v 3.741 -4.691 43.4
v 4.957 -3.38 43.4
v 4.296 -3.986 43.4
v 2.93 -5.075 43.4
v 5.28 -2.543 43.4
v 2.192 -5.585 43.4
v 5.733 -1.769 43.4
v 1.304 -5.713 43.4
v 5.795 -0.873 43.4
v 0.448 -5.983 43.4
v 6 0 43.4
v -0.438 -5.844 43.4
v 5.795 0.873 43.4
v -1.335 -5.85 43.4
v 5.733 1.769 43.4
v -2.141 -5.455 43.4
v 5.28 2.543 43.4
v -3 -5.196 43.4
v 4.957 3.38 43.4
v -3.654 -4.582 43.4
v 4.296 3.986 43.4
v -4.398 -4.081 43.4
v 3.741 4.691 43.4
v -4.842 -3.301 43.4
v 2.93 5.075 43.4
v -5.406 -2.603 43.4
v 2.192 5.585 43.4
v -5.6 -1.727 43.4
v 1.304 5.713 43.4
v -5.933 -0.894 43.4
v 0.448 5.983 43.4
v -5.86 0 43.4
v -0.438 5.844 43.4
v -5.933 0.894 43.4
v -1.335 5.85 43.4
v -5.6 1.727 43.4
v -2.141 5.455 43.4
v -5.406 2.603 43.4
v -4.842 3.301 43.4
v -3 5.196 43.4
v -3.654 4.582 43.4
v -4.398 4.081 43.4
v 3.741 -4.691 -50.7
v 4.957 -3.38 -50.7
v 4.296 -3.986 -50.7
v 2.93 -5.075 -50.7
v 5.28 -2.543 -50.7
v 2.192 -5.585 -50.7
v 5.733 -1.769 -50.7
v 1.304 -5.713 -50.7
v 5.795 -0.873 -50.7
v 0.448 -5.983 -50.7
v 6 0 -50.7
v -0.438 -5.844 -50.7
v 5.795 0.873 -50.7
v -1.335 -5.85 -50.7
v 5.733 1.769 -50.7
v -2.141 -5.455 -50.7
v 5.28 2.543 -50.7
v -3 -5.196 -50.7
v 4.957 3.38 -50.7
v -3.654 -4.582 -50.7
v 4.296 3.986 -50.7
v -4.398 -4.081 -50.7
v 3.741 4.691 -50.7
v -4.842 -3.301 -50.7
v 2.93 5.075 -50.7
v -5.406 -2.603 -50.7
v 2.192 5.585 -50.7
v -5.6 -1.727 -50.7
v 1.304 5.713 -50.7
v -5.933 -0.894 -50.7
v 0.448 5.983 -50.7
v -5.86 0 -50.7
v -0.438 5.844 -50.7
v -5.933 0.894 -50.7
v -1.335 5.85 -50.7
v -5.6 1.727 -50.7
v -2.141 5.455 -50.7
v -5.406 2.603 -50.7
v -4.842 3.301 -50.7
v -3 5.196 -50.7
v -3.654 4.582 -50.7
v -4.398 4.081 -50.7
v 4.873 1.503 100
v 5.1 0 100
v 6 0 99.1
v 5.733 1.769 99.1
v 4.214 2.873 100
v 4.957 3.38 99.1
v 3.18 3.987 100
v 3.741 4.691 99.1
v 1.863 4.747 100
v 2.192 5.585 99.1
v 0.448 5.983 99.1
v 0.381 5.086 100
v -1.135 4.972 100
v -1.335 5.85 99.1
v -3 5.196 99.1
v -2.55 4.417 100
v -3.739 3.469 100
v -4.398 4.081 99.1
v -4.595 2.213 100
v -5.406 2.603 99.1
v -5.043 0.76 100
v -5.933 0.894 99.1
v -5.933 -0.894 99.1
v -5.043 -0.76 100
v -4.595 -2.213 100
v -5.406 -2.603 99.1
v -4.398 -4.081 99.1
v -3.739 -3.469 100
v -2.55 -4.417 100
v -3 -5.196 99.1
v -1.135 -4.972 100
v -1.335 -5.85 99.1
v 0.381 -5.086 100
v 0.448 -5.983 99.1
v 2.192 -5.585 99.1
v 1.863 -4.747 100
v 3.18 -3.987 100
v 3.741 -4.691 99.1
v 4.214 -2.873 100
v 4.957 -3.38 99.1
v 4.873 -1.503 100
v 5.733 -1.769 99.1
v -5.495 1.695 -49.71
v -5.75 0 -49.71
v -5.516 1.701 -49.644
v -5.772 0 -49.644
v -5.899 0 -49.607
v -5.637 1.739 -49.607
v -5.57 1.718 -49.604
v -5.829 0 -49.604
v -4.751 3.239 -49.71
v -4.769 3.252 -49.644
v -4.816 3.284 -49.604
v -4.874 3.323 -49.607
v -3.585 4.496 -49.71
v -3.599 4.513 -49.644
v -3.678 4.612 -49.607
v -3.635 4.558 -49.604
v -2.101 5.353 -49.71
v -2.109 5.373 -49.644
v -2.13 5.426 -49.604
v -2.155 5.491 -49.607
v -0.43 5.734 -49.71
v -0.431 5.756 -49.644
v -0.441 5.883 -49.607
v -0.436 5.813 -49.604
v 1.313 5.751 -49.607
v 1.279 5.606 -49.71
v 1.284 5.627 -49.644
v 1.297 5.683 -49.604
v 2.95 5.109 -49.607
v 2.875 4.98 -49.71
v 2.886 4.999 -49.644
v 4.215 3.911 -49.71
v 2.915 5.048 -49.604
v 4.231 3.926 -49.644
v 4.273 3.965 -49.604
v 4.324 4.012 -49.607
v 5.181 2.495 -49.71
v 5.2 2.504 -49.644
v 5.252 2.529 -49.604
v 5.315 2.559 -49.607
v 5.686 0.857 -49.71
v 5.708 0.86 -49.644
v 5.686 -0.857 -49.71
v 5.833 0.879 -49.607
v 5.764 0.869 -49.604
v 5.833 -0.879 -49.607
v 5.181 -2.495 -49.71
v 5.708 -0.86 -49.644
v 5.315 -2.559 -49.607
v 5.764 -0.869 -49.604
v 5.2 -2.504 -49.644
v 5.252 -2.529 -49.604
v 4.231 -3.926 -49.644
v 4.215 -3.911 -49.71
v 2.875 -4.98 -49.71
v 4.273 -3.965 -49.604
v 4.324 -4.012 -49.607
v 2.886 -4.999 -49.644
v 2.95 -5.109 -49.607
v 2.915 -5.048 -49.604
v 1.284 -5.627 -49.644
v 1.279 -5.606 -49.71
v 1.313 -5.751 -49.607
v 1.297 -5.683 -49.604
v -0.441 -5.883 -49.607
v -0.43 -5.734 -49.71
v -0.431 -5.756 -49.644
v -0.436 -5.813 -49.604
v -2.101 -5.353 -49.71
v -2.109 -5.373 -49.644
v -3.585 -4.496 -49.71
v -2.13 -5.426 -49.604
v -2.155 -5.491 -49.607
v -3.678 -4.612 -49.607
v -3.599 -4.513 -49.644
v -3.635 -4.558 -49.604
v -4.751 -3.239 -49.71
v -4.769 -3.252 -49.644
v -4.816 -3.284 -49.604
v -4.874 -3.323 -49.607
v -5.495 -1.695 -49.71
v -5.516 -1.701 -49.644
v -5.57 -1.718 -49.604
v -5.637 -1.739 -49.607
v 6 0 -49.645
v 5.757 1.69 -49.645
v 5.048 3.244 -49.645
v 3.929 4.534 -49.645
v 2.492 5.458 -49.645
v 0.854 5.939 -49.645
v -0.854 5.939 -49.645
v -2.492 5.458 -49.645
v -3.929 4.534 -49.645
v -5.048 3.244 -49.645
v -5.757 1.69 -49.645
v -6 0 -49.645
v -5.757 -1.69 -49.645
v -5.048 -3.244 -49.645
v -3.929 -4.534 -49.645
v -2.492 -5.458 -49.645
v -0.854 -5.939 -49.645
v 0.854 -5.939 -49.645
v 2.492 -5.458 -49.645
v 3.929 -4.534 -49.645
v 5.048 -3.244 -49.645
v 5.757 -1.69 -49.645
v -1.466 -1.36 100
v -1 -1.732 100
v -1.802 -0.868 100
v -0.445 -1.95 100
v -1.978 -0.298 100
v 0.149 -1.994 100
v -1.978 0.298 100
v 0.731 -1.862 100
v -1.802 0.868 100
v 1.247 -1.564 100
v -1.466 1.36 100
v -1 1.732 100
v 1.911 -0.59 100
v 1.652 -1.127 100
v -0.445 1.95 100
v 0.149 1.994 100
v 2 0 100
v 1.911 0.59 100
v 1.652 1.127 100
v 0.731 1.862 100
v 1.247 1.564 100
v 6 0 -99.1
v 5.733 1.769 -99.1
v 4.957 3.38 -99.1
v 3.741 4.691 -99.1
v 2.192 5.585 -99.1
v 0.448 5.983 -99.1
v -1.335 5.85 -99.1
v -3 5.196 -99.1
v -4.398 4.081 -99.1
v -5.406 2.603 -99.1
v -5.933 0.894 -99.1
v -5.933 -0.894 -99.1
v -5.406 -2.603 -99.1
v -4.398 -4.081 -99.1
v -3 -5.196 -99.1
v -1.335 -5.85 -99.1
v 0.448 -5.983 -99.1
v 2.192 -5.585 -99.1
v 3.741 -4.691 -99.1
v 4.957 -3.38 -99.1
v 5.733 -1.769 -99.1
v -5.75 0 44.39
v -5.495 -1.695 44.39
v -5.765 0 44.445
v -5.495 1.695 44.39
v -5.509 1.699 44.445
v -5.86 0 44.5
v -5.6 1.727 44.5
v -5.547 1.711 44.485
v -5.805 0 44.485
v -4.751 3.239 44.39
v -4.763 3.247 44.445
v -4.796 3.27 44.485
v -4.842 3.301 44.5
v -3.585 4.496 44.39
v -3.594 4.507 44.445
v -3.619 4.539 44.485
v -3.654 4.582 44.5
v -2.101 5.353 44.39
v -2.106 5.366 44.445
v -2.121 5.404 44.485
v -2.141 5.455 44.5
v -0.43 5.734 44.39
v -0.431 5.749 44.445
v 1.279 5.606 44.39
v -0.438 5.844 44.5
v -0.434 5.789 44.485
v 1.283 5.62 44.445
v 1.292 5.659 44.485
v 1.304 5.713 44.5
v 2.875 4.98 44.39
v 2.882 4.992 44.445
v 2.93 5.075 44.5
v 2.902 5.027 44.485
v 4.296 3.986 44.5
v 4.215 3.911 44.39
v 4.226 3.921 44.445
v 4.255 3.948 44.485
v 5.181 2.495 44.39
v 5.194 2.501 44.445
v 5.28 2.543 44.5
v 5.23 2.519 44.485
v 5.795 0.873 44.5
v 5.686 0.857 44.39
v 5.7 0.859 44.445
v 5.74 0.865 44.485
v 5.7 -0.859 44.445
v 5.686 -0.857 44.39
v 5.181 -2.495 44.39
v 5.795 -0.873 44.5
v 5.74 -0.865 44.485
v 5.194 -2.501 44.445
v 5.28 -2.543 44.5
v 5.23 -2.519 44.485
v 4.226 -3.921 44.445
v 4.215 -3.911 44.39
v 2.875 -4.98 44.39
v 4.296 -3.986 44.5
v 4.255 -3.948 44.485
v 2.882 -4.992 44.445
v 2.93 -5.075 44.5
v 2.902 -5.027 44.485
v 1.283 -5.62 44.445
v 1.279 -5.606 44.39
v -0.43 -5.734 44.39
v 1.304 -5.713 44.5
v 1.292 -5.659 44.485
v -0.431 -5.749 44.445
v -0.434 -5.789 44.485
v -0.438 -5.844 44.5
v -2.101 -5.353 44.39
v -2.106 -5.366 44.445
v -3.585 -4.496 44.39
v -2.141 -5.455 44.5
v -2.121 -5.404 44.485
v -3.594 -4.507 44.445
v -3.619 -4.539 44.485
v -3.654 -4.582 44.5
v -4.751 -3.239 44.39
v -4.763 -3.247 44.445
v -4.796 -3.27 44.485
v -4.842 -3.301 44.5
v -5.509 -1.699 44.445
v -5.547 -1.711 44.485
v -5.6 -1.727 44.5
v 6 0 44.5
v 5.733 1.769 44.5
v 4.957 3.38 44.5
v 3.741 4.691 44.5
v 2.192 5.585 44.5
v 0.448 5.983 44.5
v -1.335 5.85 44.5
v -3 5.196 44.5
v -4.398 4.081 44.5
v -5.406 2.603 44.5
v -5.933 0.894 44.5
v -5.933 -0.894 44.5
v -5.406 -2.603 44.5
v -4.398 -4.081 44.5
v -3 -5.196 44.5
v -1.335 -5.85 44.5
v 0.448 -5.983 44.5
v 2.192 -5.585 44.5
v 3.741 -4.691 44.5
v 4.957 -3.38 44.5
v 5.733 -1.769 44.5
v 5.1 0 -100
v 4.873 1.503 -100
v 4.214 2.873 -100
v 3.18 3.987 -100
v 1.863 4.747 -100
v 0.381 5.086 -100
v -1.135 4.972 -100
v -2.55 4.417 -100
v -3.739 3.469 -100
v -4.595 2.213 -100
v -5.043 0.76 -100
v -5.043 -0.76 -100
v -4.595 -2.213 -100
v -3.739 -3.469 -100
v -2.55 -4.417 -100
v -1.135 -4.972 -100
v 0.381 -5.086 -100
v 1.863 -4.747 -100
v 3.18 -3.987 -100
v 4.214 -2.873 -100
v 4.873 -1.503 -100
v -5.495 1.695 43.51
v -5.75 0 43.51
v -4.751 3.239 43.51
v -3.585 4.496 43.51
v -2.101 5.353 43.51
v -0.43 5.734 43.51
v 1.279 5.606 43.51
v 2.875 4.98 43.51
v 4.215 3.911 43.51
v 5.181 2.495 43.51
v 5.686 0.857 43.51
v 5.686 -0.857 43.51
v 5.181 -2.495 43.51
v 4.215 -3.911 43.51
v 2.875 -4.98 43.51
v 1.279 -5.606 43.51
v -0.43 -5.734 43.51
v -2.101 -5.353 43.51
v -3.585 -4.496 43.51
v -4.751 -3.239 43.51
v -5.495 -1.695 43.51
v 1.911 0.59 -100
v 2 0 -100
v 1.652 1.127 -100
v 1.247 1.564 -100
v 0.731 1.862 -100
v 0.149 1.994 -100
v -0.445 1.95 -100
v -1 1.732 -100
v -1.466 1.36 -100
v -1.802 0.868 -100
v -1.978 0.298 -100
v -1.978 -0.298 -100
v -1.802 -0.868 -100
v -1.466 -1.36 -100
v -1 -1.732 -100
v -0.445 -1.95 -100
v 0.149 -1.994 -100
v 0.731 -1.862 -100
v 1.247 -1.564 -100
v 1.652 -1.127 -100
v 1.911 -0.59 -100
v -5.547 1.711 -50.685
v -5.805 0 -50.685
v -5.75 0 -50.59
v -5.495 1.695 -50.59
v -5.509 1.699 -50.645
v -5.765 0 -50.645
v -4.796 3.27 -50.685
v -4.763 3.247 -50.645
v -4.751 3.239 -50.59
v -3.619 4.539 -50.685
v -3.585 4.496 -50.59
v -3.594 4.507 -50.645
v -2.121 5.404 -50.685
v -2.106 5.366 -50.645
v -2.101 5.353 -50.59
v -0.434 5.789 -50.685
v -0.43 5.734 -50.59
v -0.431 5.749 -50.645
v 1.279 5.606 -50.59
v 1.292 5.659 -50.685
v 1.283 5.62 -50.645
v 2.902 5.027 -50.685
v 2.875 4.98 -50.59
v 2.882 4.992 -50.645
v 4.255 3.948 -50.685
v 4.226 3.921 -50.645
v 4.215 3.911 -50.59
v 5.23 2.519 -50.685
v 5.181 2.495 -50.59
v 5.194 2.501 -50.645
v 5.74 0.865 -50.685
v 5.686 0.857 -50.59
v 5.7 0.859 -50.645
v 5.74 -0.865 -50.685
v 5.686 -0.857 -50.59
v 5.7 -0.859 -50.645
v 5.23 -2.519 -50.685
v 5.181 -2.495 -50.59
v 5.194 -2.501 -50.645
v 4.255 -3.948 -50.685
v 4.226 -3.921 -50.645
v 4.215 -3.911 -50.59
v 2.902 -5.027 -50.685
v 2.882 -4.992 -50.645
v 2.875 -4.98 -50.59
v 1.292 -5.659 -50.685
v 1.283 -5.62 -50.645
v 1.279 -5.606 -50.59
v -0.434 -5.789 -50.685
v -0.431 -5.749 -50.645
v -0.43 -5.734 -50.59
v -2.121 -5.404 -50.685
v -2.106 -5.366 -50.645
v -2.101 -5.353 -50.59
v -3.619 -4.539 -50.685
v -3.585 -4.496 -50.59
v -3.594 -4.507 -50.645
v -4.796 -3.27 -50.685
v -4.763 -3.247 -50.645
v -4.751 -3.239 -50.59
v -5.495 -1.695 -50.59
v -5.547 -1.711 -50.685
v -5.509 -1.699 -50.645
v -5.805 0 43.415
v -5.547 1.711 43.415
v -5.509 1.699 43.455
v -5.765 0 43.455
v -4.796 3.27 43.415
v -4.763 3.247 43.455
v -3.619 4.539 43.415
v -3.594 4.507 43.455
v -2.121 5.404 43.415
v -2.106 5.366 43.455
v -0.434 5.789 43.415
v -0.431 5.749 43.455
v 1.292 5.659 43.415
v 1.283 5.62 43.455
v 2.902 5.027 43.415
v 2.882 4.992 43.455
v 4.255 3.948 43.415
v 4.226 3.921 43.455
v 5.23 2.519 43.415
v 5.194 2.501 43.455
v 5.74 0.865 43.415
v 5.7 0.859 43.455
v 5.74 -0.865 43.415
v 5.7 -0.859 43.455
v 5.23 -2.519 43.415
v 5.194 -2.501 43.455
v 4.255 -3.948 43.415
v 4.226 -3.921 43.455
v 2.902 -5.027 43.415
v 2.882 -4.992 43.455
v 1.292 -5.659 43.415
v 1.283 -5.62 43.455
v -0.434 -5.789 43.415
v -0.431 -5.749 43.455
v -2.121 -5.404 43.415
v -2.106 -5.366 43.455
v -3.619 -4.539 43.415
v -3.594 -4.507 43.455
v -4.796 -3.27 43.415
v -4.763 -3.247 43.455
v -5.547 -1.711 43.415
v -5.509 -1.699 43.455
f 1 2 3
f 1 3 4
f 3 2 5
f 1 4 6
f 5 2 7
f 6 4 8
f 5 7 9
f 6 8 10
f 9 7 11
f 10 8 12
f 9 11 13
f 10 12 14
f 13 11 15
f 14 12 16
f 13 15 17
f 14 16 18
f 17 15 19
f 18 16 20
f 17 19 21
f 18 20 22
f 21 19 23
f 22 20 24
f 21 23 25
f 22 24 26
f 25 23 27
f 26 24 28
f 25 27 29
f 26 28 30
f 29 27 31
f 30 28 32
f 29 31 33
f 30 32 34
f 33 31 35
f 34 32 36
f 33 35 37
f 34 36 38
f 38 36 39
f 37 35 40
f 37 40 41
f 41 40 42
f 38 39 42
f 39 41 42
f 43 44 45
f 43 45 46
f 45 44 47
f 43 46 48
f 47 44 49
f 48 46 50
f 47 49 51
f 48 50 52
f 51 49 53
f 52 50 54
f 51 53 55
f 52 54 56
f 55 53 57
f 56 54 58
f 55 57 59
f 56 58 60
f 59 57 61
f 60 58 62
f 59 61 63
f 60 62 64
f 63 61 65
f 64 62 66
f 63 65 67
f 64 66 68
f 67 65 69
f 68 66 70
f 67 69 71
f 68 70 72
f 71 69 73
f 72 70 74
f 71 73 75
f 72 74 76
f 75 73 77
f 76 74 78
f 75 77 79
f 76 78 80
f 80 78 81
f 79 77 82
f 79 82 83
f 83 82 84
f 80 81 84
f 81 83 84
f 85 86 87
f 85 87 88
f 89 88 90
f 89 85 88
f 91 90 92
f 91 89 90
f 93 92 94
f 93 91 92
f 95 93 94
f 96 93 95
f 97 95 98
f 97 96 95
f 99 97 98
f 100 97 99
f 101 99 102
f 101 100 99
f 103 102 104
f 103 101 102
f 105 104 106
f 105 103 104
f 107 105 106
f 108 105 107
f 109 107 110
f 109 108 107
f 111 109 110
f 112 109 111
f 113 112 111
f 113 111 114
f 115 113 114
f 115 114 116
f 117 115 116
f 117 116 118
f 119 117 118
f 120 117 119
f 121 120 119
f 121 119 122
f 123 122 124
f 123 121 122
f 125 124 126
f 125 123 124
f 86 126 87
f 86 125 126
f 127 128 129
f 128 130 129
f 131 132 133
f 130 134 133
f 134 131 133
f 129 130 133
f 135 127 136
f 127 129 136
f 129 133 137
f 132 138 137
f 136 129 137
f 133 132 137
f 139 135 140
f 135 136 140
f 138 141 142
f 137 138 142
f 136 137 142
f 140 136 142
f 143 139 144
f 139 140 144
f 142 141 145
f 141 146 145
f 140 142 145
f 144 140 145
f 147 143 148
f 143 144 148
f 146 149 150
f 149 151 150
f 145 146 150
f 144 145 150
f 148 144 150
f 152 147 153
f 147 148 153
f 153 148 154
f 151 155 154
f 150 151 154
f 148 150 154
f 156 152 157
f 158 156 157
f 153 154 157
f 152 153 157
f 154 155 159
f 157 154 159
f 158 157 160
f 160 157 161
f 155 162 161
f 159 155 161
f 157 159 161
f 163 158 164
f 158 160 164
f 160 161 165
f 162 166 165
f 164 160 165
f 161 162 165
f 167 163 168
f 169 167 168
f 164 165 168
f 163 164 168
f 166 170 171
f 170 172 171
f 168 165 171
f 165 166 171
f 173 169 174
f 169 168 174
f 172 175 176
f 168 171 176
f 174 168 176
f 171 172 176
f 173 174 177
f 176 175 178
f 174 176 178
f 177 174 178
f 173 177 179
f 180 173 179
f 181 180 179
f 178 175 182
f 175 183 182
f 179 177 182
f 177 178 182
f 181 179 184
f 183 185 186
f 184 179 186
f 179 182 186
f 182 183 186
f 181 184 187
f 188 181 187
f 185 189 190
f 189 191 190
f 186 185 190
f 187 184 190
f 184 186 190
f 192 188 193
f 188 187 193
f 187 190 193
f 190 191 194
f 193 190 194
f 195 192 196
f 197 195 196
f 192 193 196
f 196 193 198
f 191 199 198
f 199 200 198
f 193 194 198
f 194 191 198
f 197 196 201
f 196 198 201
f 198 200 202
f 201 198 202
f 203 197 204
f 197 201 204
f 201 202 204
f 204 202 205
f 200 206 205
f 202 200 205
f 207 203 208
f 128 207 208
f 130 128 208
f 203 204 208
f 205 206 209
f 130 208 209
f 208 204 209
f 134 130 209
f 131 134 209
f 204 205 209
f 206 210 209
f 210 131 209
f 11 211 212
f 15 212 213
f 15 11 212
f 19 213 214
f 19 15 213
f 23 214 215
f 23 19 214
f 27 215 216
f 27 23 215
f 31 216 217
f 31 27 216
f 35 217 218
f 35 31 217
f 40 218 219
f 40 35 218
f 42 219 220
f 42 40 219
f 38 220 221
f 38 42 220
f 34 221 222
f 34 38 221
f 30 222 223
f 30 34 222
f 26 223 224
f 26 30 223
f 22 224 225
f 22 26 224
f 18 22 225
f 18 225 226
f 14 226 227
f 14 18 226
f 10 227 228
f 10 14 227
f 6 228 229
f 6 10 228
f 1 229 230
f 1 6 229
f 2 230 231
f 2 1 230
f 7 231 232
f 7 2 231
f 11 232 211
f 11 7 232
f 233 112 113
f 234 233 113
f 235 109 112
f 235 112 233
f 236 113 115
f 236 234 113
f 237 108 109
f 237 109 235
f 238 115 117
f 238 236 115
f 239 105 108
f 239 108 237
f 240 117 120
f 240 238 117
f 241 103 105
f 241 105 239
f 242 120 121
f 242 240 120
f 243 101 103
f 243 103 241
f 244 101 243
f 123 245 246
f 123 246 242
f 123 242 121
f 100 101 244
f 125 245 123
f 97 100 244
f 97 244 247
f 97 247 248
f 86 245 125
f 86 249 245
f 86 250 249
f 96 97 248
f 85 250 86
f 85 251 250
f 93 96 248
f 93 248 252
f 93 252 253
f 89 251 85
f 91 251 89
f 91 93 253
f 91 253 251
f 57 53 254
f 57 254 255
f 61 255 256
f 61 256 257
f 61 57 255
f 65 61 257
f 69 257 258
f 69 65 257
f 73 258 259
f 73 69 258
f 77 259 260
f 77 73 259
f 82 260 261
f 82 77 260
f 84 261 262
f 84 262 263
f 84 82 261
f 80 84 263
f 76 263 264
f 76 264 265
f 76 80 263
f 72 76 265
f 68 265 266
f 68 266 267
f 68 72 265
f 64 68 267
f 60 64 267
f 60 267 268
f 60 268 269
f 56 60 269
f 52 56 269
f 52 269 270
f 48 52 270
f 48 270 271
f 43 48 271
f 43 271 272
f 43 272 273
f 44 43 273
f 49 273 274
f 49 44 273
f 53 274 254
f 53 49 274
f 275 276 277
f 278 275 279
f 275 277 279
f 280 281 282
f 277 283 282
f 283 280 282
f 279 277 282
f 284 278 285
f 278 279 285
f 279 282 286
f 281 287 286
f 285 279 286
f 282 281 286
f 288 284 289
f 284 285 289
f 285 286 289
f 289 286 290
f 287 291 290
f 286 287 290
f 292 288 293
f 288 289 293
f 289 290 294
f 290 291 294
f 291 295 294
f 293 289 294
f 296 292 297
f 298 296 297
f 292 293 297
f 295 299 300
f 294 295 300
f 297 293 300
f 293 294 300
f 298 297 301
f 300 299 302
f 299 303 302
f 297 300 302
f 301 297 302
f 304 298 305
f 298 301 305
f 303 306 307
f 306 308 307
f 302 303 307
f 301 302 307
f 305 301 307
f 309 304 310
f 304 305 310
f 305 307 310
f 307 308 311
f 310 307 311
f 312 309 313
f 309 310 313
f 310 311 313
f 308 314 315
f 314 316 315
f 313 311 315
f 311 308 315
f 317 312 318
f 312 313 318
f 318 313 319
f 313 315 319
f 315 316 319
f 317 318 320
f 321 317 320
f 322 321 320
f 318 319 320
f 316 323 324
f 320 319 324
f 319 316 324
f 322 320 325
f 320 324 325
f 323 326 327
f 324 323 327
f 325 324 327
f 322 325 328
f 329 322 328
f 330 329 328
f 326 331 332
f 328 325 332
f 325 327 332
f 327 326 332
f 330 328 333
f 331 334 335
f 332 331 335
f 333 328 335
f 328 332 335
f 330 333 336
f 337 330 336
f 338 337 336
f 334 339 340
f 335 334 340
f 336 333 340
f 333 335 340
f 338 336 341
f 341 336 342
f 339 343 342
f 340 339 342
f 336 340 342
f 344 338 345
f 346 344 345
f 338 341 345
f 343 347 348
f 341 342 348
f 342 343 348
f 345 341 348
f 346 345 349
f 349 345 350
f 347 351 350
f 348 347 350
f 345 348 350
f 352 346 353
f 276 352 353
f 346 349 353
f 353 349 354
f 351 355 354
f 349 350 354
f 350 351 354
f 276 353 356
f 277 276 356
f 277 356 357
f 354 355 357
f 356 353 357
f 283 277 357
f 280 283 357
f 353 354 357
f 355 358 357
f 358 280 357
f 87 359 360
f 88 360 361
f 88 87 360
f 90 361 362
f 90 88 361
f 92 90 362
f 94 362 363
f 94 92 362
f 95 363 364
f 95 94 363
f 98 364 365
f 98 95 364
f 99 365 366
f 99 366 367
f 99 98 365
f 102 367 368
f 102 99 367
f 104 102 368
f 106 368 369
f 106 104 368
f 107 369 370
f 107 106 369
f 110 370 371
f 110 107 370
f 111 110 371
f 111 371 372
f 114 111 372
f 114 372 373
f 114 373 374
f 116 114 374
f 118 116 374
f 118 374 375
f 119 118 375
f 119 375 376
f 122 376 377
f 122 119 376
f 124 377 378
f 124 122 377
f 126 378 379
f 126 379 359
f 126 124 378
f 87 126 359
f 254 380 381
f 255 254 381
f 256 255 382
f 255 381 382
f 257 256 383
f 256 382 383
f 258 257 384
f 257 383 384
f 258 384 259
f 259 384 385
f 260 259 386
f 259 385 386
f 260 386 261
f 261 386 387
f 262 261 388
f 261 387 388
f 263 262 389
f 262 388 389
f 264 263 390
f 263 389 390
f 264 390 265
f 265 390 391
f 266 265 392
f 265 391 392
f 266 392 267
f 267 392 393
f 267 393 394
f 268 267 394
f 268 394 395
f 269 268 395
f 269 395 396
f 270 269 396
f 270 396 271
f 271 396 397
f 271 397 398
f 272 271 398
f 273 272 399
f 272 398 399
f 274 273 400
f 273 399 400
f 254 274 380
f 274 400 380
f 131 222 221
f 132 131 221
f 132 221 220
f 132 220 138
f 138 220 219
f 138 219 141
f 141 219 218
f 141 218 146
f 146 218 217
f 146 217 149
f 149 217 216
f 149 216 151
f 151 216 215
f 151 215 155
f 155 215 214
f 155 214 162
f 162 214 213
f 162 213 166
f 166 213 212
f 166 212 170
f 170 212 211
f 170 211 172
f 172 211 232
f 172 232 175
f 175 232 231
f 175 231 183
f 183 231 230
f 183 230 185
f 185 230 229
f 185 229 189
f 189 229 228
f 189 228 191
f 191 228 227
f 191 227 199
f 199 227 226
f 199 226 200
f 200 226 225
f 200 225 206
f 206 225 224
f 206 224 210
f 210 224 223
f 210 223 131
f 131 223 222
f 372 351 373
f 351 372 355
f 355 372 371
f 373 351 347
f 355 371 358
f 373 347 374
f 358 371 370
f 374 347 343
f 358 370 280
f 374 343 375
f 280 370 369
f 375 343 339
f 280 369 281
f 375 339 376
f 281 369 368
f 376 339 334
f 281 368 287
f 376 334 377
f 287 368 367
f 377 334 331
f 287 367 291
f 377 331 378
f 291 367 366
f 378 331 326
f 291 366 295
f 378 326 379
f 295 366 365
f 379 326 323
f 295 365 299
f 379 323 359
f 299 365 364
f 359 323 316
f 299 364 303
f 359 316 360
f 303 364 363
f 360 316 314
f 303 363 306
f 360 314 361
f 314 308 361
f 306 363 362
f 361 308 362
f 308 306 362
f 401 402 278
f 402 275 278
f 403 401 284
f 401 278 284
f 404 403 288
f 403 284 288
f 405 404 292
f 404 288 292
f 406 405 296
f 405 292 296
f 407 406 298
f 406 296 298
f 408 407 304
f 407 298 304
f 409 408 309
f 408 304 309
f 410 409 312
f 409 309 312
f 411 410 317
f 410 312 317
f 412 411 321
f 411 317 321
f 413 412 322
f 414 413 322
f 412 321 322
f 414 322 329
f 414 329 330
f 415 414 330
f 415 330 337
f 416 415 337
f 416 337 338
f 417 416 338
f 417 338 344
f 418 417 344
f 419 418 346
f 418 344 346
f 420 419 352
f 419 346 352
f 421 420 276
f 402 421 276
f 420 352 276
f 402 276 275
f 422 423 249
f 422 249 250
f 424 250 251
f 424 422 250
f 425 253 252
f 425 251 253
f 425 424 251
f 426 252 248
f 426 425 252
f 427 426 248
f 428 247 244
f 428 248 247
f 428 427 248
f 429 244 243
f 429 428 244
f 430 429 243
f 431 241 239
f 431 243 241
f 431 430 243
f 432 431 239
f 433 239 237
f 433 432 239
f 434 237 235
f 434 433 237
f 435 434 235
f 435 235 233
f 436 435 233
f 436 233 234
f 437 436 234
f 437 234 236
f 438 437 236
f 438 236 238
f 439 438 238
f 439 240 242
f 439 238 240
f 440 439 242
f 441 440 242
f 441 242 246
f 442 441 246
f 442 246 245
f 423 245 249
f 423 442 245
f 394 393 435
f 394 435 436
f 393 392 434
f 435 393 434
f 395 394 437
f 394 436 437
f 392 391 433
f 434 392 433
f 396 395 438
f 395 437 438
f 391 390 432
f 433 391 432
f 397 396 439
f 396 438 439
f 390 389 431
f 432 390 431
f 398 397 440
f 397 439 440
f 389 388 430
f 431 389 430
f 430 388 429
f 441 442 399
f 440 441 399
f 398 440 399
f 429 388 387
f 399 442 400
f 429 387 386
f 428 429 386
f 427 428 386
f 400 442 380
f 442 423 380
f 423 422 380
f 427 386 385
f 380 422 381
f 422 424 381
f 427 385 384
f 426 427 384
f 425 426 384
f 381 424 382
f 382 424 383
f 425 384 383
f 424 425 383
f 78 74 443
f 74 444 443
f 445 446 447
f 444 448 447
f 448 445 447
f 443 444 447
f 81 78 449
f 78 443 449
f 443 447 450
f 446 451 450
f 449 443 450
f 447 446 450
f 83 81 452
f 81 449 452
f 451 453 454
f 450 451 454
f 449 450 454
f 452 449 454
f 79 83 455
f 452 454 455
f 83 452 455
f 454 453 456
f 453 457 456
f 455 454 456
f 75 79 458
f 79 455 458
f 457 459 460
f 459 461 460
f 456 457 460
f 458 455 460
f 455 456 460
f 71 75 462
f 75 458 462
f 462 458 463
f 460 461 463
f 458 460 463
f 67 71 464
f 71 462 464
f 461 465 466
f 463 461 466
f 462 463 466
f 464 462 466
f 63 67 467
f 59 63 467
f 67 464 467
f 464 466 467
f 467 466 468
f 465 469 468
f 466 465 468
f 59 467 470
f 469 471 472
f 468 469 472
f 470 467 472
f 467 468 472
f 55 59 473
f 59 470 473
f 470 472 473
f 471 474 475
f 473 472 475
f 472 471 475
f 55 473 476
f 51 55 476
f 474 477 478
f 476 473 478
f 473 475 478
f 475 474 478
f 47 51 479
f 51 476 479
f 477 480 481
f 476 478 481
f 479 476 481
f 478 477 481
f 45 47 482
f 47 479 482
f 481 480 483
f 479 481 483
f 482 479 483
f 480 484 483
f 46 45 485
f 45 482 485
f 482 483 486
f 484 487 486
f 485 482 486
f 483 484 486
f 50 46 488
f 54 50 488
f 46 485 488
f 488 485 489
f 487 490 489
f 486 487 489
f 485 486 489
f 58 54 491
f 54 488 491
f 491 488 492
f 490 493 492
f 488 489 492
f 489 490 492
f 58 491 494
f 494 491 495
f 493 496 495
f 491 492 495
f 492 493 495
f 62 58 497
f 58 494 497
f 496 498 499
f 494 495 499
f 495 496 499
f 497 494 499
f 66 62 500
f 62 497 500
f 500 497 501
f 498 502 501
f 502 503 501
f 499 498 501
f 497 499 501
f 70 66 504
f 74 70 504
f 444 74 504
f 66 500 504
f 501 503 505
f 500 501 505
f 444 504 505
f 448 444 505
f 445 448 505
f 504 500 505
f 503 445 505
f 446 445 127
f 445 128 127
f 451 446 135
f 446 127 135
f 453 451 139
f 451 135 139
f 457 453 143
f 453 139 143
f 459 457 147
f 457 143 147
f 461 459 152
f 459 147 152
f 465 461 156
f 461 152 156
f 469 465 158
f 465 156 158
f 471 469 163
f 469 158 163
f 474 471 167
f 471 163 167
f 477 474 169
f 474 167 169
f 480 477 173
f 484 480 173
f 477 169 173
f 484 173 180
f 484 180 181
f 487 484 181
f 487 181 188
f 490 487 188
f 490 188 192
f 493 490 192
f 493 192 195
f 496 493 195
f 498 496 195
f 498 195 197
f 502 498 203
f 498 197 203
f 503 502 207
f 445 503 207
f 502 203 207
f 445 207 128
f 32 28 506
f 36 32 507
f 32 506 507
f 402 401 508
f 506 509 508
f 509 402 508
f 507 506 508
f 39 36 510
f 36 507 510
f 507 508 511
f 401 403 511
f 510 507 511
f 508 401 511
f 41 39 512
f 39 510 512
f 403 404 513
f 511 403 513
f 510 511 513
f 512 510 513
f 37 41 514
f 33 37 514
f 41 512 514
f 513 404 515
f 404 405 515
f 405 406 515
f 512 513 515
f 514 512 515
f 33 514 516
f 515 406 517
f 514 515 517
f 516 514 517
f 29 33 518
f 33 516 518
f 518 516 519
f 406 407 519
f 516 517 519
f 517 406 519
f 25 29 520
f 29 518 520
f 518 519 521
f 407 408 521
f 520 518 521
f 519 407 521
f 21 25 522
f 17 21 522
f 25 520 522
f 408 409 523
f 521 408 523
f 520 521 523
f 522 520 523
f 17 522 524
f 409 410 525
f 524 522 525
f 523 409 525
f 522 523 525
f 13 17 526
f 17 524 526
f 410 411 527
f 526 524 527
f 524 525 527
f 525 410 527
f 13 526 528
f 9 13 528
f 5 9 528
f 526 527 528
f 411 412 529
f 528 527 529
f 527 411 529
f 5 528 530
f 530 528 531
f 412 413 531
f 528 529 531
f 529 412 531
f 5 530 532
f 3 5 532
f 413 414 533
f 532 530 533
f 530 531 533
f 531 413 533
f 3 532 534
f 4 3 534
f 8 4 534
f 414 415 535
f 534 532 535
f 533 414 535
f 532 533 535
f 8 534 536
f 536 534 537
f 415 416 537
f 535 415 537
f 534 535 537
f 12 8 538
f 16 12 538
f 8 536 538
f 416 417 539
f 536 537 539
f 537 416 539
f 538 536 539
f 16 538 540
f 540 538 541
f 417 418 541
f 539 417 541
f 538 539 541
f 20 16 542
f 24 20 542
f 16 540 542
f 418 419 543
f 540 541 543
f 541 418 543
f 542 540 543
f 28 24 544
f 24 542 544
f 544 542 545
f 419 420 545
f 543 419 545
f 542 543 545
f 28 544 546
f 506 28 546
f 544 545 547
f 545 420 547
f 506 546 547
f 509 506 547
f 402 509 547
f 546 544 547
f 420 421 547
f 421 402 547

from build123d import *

# Parameters (mm, degrees)
SKETCH1_R           = 6
EXTRUDE1_DEPTH      = 100
CHAMFER1_SIZE       = 0.9
EXTRUDE3_DEPTH      = 101.359354322
EXTRUDE3_DEPTH_BACK = 101.359354322
SKETCH2_R           = 2


with BuildPart() as part:
    # Sketch1 → Extrude1 (new, symmetric)
    with BuildSketch(Plane.XY):
        Circle(SKETCH1_R)
    extrude(amount=EXTRUDE1_DEPTH, both=True)

    # Chamfer1
    chamfer1_edges = [part.edges().sort_by_distance(p)[0] for p in [
        (-6, 0, -100),
        (-6, 0, 100),
    ]]
    chamfer(chamfer1_edges, length=CHAMFER1_SIZE)

    # Sketch2 → Extrude3 (cut, two sides: drawn at the far end of the back side and taken through both)
    with BuildSketch(Plane.XY.offset(-EXTRUDE3_DEPTH_BACK)):
        Circle(SKETCH2_R)
    extrude(amount=EXTRUDE3_DEPTH + EXTRUDE3_DEPTH_BACK, mode=Mode.SUBTRACT)

    # Sketch5 → Groove for DIN 471 - 12 x 1_ Circlip for (revolve, cut)
    with BuildSketch(Plane(origin=(0, 0, 100), x_dir=(0, 1, 0), z_dir=(-1, 0, 0)), mode=Mode.PRIVATE) as groove_for_din_471_12_x_1_circlip_for_sk:
        with BuildLine():
            Line((5.86, 55.5), (7.2, 55.5))
            Line((7.2, 55.5), (7.2, 56.6))
            Line((7.2, 56.6), (5.86, 56.6))
            ThreePointArc((5.86, 56.6), (5.782218254, 56.567781746), (5.75, 56.49))
            Line((5.75, 56.49), (5.75, 55.61))
            ThreePointArc((5.75, 55.61), (5.782218254, 55.532218254), (5.86, 55.5))
        make_face()
    revolve(groove_for_din_471_12_x_1_circlip_for_sk.sketch.rotate(Axis((0, 0, 150), (0, 0, -1)), 270), axis=Axis((0, 0, 150), (0, 0, -1)), mode=Mode.SUBTRACT)

    # Sketch7 → Groove for DIN 471 - 12 x 1_ Circlip 2 (revolve, cut)
    with BuildSketch(Plane(origin=(0, 0, 100), x_dir=(0, 1, 0), z_dir=(-1, 0, 0)), mode=Mode.PRIVATE) as groove_for_din_471_12_x_1_circlip_2_sk:
        with BuildLine():
            Line((5.899017031, 149.607152194), (7.198150102, 150.1))
            Line((7.198150102, 150.1), (7.2, 150.7))
            Line((7.2, 150.7), (5.86, 150.7))
            ThreePointArc((5.86, 150.7), (5.782218254, 150.667781746), (5.75, 150.59))
            Line((5.75, 150.59), (5.75, 149.71))
            ThreePointArc((5.75, 149.71), (5.797517496, 149.619468587), (5.899017031, 149.607152194))
        make_face()
    revolve(groove_for_din_471_12_x_1_circlip_2_sk.sketch.rotate(Axis((0, 0, 150), (0, 0, -1)), 270), axis=Axis((0, 0, 150), (0, 0, -1)), mode=Mode.SUBTRACT)


solid = part.part
